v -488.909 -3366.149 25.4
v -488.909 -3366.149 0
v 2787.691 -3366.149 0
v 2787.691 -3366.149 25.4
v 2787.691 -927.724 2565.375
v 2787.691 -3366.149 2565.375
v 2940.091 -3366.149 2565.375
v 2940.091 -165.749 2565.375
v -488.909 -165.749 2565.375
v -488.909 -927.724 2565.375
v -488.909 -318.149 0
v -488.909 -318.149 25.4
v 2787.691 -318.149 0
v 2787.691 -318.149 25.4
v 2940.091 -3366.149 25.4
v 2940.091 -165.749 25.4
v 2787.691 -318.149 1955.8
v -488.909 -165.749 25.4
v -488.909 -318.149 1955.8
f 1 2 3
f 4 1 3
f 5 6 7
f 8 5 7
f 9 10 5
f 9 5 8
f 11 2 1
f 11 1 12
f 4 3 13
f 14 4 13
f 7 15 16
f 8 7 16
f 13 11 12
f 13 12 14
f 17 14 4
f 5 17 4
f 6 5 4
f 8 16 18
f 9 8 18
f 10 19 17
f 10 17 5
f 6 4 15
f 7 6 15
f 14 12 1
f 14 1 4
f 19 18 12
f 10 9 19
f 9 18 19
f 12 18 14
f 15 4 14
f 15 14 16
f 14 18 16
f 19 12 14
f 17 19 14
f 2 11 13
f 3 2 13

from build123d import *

# Parameters (mm, degrees)
F0_W     = 3276.6
F0_H     = 3048
F1_DEPTH = 25.4
F3_DEPTH = 2539.9746
F5_DEPTH = 3276.6


with BuildPart() as f1:
    # F0 (on Top) → F1 (new body)
    with BuildSketch(Plane.XY):
        with Locations((1149.391323, -1842.149369)):
            Rectangle(F0_W, F0_H)
    extrude(amount=F1_DEPTH)

    # F2 (on face) → F3 (join)
    with BuildSketch(Plane.XY.offset(25.4)):
        Polygon((-488.908677, -165.749369), (-488.908677, -318.149369), (2787.691323, -318.149369), (2787.691323, -3366.149369), (2940.091323, -3366.149369), (2940.091323, -165.749369), align=None)
    extrude(amount=F3_DEPTH)

    # F4 (on face) → F5 (join, through all)
    with BuildSketch(Plane(origin=(-488.908677, 0, 0), x_dir=(0, -1, 0), z_dir=(-1, 0, 0))):
        Polygon((927.723969, 2565.3746), (318.149369, 2565.3746), (318.149369, 1955.8), align=None)
    extrude(amount=-F5_DEPTH)


solid = f1.part
